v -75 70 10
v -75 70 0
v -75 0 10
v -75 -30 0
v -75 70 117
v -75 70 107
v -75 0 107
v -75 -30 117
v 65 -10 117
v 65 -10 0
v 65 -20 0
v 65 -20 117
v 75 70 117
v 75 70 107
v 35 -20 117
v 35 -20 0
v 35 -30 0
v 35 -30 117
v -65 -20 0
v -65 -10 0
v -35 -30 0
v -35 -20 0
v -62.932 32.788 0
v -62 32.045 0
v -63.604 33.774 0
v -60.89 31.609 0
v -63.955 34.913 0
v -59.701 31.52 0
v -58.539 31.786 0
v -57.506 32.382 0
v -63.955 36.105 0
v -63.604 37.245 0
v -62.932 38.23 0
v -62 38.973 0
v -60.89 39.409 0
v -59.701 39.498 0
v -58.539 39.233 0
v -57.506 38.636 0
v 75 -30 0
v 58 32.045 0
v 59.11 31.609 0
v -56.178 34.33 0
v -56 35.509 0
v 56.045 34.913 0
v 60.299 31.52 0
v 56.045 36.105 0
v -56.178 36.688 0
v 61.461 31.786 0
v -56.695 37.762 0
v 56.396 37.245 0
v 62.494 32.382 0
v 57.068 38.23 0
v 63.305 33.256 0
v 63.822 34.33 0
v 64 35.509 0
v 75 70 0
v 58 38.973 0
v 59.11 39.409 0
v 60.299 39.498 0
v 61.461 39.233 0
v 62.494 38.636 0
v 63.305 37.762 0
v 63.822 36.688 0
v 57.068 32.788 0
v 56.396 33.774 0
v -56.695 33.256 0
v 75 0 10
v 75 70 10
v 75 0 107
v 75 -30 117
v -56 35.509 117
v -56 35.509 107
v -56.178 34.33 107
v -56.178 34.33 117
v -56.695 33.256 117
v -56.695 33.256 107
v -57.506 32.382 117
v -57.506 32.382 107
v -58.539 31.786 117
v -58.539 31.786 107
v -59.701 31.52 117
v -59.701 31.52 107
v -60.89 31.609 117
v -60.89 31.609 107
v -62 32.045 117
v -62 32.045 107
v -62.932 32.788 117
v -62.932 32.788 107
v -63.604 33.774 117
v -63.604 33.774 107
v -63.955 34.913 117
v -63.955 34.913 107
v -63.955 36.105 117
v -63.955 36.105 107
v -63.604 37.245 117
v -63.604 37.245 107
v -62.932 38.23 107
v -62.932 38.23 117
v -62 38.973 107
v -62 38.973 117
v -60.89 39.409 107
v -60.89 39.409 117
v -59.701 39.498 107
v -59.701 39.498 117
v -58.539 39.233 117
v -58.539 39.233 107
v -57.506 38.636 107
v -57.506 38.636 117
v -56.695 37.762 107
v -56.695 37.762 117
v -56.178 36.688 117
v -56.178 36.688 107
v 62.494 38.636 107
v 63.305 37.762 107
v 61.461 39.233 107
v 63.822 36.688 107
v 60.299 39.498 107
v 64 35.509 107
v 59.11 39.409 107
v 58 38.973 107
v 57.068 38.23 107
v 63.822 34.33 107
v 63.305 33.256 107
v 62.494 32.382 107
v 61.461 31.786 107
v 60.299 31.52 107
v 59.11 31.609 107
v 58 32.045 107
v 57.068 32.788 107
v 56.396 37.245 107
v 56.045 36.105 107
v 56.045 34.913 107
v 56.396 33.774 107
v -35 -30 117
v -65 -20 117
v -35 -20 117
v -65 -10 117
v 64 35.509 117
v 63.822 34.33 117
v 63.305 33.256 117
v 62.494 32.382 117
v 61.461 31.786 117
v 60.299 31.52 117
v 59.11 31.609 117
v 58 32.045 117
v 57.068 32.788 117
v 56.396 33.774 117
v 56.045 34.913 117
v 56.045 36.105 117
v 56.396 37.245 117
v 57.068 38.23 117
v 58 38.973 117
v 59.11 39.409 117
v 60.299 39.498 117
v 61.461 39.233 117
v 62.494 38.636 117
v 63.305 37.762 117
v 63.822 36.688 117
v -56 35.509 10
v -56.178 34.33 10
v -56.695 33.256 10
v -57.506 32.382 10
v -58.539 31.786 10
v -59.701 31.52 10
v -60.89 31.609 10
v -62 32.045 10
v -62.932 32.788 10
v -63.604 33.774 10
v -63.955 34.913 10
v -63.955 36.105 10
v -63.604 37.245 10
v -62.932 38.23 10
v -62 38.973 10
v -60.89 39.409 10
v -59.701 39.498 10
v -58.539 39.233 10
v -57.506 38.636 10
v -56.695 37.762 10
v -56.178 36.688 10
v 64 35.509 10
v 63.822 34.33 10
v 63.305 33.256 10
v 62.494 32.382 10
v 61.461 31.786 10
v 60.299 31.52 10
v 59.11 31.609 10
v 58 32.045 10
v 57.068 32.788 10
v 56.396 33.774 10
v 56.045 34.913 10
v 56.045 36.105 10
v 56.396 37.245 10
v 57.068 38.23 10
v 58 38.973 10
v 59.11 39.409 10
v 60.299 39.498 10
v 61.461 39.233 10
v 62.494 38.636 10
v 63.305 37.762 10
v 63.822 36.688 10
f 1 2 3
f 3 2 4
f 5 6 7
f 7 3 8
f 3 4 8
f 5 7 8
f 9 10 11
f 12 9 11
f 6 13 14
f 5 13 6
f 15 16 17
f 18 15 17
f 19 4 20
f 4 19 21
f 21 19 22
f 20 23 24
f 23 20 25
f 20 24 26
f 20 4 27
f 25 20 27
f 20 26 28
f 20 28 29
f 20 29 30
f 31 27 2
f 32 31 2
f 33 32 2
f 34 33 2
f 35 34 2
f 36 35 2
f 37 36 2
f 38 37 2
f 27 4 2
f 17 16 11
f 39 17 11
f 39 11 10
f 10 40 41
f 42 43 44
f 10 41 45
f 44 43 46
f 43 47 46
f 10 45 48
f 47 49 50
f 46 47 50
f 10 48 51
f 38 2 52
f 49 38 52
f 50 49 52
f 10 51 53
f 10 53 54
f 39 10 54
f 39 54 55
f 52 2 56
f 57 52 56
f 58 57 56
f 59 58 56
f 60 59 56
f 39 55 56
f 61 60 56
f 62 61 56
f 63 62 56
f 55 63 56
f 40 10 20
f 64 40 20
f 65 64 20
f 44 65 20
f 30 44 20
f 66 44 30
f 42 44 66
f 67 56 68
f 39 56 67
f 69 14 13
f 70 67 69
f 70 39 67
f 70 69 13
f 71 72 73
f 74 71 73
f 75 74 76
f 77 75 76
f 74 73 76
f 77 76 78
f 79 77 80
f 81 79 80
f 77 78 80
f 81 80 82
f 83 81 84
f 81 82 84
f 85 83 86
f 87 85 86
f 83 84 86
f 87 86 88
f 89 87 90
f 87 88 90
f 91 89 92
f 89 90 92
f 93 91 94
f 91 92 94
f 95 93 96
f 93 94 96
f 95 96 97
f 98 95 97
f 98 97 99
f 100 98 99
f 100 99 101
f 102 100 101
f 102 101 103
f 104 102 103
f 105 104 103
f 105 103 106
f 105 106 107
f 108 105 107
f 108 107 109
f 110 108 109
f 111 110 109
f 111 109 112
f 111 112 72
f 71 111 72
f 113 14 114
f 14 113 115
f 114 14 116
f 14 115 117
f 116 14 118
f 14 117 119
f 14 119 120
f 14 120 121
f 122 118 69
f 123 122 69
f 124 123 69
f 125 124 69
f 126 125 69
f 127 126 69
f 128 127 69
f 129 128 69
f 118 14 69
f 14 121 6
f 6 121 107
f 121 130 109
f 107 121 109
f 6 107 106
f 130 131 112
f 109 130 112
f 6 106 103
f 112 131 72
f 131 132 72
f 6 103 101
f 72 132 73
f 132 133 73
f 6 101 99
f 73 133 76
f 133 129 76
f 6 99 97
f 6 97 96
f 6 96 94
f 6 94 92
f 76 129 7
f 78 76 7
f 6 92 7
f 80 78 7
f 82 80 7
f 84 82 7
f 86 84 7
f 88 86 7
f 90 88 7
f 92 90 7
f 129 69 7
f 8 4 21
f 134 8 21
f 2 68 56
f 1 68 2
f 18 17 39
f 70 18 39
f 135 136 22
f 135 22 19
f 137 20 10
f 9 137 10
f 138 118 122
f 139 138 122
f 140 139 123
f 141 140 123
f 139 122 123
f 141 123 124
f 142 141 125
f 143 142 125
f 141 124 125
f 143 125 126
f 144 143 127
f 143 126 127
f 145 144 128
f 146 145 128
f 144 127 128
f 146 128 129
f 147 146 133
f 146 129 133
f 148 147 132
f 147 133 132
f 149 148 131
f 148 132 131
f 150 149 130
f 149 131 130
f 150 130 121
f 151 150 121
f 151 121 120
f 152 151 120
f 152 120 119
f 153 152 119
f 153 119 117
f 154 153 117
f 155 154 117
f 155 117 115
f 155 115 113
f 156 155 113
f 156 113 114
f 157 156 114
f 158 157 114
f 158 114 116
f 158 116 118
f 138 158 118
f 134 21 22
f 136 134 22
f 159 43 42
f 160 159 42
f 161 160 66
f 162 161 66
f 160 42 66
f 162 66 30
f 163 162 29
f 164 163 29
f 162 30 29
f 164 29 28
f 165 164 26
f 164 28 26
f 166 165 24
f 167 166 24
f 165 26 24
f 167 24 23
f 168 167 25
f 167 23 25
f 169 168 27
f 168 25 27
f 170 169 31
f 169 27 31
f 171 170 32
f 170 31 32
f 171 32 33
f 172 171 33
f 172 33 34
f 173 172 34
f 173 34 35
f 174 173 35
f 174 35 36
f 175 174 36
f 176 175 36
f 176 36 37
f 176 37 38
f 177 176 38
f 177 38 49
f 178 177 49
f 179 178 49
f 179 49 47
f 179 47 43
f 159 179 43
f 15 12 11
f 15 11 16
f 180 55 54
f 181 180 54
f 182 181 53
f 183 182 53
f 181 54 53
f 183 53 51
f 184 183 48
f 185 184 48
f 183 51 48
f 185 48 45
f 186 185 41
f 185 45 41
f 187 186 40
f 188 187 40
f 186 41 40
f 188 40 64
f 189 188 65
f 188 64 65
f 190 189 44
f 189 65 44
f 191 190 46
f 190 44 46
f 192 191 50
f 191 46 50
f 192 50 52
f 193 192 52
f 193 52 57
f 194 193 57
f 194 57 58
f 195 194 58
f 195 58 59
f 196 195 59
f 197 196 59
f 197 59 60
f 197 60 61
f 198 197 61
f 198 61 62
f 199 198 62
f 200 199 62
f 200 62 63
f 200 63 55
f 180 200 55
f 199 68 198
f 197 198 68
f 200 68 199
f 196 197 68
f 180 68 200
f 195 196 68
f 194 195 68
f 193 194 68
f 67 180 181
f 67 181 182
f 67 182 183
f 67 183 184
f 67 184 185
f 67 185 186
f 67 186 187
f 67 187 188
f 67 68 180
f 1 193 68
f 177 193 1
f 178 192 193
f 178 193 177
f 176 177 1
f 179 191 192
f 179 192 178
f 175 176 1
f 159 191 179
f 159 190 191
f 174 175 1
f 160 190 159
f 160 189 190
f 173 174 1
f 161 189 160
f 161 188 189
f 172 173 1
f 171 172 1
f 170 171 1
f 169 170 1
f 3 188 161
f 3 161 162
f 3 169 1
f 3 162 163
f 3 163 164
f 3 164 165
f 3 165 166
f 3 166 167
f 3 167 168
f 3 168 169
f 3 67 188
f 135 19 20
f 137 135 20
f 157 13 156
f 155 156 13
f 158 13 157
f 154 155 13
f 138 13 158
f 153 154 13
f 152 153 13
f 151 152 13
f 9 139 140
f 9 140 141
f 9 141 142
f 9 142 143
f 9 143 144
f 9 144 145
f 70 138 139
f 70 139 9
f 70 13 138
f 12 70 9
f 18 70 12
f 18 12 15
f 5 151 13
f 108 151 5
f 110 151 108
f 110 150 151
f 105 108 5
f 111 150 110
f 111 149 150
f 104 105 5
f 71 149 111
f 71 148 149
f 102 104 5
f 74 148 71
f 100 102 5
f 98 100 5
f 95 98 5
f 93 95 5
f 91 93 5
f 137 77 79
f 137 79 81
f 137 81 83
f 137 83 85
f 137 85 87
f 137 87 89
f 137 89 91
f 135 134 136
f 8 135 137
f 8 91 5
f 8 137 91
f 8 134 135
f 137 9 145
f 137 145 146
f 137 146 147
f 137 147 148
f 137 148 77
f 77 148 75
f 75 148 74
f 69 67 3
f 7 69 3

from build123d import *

# Parameters (mm, degrees)
F1_DEPTH = 117
F2_W     = 150
F2_H     = 10
F3_DEPTH = 70
F4_R     = 4
F5_DEPTH = 139.1


with BuildPart() as f1:
    # F0 (on Top) → F1 (new body)
    with BuildSketch(Plane.XY):
        Polygon((-75, -30), (-35, -30), (-35, -20), (-65, -20), (-65, -10), (65, -10), (65, -20), (35, -20), (35, -30), (75, -30), (75, 0), (-75, 0), align=None)
    extrude(amount=F1_DEPTH)

    # F2 (on face) → F3 (join)
    with BuildSketch(Plane(origin=(0, 0, 0), x_dir=(-1, 0, 0), z_dir=(0, 1, 0))):
        with Locations((0, 112)):
            Rectangle(F2_W, F2_H)
        with Locations((0, 5)):
            Rectangle(F2_W, F2_H)
    extrude(amount=F3_DEPTH)

    # F4 (on face) → F5 (cut)
    with BuildSketch(Plane(origin=(0, 0, 0), x_dir=(1, 0, 0), z_dir=(0, 0, -1))):
        with Locations((-60, -35.509091)):
            Circle(F4_R)
        with Locations((60, -35.509091)):
            Circle(F4_R)
    extrude(amount=-F5_DEPTH, mode=Mode.SUBTRACT)


solid = f1.part
